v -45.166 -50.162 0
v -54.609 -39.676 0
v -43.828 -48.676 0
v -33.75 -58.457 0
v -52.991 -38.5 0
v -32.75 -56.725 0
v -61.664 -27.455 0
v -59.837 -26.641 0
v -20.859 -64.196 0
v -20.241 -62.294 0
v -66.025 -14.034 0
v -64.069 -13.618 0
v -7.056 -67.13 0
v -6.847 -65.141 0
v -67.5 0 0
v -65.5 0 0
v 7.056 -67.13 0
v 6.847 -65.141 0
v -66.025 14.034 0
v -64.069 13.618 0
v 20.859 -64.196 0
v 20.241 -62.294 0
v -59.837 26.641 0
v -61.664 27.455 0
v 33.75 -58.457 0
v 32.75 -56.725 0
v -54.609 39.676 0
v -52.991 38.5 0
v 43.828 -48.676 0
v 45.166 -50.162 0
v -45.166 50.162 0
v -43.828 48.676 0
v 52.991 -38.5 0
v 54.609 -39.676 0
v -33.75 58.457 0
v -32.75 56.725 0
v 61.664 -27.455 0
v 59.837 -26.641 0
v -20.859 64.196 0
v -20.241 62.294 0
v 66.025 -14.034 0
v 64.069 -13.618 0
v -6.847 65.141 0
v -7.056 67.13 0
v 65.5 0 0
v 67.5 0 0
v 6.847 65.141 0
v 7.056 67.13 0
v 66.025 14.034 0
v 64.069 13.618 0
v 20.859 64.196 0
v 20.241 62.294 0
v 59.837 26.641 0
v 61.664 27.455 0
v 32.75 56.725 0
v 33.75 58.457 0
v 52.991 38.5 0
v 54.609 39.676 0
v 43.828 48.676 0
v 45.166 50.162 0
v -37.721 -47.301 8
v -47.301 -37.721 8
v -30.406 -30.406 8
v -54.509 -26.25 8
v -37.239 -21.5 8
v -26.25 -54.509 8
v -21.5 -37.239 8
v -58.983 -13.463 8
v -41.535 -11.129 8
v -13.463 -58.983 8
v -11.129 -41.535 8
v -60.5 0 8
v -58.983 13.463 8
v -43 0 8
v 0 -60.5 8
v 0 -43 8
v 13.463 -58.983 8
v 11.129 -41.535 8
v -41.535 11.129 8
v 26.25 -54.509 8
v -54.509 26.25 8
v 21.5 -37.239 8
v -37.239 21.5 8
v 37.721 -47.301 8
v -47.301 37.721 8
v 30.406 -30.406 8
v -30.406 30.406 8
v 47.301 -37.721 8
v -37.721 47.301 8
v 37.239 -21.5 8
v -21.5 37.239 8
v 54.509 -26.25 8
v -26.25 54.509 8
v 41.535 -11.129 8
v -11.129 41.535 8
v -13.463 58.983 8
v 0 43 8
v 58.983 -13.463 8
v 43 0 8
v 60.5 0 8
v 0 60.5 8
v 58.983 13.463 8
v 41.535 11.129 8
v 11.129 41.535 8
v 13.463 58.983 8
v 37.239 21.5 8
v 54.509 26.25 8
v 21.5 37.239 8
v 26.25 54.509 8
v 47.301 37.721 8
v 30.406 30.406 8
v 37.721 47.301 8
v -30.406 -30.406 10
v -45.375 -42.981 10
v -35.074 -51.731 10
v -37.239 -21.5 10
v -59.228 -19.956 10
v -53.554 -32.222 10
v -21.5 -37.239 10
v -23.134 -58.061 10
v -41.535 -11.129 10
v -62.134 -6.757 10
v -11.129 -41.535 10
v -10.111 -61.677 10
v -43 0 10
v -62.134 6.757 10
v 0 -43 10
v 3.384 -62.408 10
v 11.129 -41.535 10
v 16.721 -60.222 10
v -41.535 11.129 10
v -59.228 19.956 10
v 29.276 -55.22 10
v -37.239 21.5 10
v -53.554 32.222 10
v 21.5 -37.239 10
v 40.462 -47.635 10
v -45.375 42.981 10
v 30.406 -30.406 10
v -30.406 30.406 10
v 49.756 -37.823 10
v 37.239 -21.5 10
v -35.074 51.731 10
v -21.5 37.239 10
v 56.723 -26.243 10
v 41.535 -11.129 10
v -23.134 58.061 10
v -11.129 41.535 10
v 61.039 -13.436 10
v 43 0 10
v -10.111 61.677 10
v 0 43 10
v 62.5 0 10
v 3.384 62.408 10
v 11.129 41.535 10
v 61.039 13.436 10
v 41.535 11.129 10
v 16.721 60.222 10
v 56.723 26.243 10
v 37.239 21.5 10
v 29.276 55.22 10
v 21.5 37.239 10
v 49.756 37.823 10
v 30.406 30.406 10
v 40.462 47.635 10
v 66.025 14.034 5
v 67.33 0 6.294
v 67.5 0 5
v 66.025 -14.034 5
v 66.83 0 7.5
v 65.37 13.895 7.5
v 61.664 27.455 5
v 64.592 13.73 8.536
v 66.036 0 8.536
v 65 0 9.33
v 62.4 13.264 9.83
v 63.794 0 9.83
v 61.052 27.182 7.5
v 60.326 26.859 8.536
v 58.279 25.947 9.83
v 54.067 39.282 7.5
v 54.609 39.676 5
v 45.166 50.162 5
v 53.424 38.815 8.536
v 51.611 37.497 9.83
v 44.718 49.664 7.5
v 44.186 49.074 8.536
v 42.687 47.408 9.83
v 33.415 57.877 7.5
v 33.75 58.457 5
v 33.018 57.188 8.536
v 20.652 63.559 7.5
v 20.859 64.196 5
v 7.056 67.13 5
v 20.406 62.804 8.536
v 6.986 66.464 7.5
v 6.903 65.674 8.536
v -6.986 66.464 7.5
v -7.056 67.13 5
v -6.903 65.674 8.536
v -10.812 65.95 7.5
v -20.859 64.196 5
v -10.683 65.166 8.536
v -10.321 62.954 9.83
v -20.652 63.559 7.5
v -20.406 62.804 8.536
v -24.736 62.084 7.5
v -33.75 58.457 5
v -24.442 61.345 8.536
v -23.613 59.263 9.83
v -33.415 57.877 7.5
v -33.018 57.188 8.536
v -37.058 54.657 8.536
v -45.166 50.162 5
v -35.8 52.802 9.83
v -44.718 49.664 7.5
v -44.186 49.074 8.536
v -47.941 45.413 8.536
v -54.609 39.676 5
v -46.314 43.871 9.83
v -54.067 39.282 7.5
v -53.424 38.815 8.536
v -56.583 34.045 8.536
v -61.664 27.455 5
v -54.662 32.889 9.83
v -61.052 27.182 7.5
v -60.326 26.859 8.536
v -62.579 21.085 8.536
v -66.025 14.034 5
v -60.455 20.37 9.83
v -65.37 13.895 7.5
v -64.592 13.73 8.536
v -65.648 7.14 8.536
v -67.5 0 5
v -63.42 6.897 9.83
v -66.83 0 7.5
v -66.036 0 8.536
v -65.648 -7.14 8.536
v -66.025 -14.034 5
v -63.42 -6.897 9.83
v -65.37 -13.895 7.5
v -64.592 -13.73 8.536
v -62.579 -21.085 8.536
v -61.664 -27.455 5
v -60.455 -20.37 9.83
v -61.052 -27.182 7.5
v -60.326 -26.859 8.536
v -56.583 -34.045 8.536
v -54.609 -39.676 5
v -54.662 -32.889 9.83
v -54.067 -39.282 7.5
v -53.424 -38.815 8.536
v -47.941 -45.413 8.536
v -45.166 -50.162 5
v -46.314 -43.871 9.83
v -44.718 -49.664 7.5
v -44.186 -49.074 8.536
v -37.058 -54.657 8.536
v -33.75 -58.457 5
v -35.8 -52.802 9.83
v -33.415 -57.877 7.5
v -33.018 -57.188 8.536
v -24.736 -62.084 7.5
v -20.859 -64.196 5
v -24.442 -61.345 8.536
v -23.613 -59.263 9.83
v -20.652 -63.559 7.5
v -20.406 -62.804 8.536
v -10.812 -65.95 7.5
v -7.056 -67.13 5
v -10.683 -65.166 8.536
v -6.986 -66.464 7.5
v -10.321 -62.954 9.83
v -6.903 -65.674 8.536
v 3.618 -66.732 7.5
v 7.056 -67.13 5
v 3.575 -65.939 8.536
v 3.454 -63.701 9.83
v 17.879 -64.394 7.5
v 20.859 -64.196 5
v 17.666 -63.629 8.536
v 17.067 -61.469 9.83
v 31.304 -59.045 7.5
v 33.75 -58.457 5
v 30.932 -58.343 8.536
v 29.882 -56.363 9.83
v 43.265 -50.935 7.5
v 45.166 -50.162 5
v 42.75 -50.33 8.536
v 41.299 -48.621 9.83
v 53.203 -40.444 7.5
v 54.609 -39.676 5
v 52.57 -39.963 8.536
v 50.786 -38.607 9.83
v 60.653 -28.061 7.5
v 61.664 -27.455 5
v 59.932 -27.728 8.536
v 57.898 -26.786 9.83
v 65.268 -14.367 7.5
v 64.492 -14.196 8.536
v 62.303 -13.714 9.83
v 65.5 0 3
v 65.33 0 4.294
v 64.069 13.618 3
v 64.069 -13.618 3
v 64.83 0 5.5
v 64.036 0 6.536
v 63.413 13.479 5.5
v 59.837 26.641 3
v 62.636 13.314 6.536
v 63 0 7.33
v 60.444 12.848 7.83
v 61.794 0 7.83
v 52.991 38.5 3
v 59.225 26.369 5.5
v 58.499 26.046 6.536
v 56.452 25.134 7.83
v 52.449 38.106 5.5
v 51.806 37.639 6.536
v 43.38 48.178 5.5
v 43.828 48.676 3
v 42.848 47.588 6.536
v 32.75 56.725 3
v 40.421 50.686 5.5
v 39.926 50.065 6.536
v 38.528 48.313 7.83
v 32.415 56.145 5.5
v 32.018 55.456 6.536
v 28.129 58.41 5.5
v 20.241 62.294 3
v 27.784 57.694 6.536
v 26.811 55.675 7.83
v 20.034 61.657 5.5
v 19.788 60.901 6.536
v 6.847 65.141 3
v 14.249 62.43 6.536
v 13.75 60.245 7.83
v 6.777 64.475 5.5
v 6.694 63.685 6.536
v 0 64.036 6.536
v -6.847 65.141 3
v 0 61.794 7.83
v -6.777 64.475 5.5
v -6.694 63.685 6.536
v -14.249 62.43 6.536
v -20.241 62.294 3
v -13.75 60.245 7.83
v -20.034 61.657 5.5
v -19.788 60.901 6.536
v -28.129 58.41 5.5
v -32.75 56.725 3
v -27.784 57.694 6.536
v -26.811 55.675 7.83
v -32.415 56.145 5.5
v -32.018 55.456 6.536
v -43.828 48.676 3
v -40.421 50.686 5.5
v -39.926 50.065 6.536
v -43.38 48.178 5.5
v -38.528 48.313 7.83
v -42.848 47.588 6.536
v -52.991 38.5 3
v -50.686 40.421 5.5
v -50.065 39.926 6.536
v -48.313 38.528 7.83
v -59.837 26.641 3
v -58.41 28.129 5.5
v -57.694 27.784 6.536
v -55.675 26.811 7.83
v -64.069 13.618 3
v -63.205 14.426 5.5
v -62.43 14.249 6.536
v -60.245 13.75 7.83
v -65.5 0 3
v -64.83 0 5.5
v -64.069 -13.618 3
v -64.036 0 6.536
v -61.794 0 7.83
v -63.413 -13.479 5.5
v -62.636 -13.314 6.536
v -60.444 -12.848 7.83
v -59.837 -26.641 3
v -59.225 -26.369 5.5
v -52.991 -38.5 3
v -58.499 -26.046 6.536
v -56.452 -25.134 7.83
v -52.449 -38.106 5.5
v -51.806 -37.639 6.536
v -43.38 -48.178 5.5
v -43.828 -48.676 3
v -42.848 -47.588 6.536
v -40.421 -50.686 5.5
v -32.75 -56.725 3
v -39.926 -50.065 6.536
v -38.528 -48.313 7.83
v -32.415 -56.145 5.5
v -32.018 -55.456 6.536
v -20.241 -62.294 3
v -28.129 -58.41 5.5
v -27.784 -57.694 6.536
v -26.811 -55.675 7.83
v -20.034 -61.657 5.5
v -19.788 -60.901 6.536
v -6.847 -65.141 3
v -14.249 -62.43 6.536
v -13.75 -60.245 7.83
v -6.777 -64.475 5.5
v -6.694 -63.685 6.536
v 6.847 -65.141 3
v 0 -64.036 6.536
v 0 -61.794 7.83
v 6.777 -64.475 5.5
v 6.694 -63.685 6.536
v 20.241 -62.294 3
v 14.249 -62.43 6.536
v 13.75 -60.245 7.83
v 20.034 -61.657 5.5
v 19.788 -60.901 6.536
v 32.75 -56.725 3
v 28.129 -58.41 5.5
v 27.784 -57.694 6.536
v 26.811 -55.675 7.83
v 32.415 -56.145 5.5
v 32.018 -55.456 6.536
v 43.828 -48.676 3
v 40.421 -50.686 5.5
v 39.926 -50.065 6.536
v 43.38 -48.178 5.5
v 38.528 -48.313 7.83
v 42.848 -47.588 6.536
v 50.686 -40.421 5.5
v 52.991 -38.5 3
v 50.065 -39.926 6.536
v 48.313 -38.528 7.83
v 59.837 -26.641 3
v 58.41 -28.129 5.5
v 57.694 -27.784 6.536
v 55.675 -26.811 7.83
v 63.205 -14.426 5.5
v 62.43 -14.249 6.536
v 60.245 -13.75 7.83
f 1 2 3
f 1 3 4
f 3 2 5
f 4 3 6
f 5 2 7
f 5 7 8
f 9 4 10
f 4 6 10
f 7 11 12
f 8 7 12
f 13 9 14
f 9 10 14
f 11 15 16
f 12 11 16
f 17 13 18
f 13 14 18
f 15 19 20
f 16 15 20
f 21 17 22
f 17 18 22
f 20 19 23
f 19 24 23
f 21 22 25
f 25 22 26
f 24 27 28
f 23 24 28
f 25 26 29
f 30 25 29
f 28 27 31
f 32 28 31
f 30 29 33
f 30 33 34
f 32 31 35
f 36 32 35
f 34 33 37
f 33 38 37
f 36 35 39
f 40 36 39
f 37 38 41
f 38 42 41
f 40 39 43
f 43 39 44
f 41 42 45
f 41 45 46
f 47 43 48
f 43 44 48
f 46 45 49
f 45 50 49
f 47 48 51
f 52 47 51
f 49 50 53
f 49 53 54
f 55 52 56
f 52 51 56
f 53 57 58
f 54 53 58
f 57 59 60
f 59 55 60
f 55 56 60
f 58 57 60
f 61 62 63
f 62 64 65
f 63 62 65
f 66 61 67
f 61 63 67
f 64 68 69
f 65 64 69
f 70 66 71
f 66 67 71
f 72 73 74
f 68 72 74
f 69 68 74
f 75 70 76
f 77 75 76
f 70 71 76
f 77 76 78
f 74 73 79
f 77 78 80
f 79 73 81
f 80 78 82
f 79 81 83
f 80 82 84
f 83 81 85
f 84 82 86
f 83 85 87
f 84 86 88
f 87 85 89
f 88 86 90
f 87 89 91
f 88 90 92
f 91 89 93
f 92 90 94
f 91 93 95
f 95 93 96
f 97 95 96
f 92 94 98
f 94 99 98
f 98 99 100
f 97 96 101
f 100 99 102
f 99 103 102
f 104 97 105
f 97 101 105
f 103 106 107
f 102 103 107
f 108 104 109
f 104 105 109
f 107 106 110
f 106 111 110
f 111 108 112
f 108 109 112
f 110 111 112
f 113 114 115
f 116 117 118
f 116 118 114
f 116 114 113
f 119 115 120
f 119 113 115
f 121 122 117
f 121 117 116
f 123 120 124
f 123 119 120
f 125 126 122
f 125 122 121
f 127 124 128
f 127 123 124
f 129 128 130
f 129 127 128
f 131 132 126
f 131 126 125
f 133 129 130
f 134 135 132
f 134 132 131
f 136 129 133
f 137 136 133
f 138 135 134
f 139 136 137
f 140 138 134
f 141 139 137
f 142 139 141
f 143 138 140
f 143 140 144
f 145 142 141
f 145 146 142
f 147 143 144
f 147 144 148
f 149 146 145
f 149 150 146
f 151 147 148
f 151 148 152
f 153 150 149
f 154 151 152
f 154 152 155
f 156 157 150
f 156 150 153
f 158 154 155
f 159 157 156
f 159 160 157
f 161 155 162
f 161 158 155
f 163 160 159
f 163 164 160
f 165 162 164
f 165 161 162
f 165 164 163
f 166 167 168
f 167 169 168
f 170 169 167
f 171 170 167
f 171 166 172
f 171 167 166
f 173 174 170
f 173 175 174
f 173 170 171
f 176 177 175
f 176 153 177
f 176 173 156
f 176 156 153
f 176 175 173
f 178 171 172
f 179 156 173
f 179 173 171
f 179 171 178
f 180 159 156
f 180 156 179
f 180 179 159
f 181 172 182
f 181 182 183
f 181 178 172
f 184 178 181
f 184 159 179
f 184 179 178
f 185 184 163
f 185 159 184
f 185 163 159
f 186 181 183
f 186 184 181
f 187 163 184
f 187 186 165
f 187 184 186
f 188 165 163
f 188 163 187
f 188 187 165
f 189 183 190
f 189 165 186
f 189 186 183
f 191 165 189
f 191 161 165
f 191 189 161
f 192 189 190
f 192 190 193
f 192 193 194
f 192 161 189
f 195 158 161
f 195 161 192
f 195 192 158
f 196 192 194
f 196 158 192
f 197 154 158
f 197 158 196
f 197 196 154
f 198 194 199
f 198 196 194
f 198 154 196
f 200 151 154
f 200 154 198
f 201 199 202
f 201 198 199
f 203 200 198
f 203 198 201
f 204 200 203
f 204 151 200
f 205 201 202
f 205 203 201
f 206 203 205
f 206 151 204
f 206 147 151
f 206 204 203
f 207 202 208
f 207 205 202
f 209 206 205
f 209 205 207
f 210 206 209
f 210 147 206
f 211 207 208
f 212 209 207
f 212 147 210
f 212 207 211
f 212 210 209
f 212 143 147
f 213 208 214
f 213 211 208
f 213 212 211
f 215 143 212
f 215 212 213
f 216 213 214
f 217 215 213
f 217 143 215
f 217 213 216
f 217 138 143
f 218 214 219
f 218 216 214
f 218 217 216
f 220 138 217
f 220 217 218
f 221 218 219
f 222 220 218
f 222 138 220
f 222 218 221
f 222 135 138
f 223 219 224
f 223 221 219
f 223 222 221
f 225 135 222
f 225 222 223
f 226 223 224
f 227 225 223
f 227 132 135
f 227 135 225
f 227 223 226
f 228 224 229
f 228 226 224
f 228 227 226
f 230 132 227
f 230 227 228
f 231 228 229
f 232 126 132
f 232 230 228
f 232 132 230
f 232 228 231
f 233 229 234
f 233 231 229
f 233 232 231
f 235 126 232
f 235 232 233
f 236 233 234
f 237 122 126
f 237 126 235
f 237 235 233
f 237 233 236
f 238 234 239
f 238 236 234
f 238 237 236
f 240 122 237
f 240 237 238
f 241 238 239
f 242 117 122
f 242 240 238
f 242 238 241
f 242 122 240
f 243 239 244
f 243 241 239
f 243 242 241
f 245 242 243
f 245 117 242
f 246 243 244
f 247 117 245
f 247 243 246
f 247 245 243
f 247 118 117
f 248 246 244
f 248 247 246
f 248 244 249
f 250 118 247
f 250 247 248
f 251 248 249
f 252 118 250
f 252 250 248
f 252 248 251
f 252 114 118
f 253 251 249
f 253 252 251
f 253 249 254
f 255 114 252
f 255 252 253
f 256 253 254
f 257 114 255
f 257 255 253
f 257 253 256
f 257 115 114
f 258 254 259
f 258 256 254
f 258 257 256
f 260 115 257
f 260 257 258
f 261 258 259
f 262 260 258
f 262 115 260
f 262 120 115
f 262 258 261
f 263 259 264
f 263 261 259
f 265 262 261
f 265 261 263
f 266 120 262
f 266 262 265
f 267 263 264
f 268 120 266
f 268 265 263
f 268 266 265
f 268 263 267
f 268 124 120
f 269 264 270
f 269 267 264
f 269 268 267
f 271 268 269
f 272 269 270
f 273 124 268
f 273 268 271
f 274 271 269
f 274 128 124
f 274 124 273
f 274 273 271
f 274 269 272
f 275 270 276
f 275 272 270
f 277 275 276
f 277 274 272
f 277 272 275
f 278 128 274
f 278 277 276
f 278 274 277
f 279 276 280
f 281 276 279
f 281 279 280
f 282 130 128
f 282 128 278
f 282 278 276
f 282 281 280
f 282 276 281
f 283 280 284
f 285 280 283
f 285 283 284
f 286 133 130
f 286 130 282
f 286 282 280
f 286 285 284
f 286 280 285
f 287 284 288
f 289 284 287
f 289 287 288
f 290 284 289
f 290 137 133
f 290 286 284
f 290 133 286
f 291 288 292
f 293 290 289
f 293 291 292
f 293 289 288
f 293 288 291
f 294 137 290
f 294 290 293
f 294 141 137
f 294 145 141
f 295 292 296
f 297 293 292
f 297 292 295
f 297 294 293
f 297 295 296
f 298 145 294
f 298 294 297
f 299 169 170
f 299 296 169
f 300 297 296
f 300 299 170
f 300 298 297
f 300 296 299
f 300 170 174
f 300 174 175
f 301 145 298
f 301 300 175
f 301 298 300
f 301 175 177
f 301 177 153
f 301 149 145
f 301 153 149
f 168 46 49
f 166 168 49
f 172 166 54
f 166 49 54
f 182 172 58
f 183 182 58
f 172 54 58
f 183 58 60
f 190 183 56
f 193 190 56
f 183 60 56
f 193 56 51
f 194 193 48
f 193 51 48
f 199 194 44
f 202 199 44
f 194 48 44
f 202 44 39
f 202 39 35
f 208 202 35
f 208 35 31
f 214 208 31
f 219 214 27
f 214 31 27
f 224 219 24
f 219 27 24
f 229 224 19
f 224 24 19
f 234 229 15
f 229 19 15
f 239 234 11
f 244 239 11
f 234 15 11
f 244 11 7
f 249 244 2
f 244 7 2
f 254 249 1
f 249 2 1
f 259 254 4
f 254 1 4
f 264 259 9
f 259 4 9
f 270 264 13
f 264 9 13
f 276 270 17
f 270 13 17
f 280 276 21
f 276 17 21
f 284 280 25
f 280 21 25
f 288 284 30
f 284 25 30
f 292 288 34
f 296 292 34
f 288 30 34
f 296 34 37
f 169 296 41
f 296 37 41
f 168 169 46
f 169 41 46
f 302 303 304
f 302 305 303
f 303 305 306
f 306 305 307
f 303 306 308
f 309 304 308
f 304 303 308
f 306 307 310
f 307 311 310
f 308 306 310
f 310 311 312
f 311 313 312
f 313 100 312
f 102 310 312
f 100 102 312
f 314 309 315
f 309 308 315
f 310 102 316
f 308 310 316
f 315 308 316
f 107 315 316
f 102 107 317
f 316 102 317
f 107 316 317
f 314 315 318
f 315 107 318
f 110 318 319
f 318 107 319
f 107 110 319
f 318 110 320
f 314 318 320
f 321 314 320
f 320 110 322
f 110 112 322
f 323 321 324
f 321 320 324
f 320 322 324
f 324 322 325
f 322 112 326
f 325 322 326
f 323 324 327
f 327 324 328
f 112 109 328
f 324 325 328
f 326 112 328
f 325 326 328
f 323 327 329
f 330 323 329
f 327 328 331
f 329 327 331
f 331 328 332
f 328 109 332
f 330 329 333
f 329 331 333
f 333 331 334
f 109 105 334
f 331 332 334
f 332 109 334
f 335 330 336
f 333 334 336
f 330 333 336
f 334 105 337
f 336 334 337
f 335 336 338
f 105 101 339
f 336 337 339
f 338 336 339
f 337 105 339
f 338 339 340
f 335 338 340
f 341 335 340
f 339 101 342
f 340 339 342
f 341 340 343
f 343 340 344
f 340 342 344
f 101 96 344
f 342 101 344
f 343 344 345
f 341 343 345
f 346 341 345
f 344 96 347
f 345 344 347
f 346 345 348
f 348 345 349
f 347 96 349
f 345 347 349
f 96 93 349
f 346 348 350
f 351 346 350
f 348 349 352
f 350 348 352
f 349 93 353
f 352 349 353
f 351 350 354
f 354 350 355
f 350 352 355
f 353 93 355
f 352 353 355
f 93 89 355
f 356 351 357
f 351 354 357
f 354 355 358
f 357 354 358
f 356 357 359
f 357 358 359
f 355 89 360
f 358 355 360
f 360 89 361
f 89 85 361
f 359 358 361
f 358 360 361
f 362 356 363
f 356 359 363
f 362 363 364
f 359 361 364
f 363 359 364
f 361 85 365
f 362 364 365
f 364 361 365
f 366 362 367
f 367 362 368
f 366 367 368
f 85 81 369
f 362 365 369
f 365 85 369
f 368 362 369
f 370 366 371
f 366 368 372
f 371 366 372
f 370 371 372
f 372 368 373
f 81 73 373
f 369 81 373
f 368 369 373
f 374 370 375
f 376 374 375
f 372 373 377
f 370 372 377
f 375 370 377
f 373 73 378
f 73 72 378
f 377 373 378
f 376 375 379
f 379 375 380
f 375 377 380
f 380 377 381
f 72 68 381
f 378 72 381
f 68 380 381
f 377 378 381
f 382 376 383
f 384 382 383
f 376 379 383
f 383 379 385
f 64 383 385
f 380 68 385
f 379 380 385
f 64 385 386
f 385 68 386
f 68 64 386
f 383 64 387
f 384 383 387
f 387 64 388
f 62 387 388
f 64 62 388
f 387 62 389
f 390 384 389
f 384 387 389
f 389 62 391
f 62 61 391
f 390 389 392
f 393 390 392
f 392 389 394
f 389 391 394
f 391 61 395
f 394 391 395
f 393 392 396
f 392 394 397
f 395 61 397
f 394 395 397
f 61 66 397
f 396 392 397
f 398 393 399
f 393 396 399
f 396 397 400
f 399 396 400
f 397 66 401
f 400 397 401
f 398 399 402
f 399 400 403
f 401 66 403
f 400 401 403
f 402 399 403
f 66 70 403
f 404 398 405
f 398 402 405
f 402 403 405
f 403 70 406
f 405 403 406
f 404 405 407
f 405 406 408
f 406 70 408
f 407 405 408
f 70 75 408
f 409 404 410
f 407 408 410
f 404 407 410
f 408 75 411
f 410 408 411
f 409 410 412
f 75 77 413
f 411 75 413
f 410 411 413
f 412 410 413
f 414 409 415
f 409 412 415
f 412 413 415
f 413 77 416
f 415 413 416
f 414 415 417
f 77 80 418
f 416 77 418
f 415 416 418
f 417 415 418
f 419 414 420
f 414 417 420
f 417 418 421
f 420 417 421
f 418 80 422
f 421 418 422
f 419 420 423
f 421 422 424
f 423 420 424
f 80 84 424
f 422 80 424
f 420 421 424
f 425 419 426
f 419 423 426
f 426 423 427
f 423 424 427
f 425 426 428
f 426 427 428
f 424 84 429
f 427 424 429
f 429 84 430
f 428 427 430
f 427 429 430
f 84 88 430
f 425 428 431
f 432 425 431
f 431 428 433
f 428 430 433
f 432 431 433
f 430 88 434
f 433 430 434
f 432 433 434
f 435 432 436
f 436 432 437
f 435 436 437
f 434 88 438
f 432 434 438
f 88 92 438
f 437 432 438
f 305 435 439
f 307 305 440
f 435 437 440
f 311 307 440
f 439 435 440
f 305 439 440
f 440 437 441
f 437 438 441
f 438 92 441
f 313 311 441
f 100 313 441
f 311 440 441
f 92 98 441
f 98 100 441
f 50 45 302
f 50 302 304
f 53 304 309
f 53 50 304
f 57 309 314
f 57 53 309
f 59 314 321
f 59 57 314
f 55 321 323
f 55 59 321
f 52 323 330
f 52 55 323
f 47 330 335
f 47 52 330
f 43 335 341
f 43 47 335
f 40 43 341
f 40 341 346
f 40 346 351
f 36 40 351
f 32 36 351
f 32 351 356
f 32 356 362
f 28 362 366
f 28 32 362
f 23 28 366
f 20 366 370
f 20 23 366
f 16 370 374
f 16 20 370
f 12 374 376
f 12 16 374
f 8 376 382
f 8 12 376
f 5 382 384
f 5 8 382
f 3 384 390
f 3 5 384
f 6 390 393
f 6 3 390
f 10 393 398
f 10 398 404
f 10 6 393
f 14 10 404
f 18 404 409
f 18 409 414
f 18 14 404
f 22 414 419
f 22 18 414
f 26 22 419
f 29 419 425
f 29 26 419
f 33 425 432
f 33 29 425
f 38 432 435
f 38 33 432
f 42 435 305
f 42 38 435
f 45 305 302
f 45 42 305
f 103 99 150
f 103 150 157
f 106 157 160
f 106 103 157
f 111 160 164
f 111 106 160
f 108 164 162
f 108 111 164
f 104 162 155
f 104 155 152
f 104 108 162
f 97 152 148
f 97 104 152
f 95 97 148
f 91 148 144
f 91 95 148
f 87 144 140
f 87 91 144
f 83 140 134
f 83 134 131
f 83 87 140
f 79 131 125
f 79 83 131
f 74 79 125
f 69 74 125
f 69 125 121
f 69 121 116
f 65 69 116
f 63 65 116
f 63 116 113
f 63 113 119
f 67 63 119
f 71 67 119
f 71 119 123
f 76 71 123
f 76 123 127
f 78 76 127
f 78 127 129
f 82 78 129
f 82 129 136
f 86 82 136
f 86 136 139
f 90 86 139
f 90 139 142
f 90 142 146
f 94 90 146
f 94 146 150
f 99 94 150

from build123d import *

# Parameters (mm, degrees)
F0_R     = 67.5
F0_R_2   = 65.5
F0_R_3   = 43
F1_DEPTH = 10
F2_DEPTH = 8
F3_R     = 5


with BuildPart() as f1:
    # F0 (on Top) → F1 (new body)
    with BuildSketch(Plane.XY):
        Circle(F0_R)
        Circle(F0_R_2, mode=Mode.SUBTRACT)
        Circle(F0_R_2)
        Circle(F0_R_3, mode=Mode.SUBTRACT)
    extrude(amount=F1_DEPTH)

    # F0 (on Top) → F2 (cut)
    with BuildSketch(Plane.XY):
        Circle(F0_R_2)
        Circle(F0_R_3, mode=Mode.SUBTRACT)
    extrude(amount=F2_DEPTH, mode=Mode.SUBTRACT)

    # F3
    f3_edges = [f1.edges().sort_by_distance(p)[0] for p in [
        (-65.5, 0, 8),
        (-67.5, 0, 10),
    ]]
    fillet(f3_edges, radius=F3_R)


solid = f1.part
